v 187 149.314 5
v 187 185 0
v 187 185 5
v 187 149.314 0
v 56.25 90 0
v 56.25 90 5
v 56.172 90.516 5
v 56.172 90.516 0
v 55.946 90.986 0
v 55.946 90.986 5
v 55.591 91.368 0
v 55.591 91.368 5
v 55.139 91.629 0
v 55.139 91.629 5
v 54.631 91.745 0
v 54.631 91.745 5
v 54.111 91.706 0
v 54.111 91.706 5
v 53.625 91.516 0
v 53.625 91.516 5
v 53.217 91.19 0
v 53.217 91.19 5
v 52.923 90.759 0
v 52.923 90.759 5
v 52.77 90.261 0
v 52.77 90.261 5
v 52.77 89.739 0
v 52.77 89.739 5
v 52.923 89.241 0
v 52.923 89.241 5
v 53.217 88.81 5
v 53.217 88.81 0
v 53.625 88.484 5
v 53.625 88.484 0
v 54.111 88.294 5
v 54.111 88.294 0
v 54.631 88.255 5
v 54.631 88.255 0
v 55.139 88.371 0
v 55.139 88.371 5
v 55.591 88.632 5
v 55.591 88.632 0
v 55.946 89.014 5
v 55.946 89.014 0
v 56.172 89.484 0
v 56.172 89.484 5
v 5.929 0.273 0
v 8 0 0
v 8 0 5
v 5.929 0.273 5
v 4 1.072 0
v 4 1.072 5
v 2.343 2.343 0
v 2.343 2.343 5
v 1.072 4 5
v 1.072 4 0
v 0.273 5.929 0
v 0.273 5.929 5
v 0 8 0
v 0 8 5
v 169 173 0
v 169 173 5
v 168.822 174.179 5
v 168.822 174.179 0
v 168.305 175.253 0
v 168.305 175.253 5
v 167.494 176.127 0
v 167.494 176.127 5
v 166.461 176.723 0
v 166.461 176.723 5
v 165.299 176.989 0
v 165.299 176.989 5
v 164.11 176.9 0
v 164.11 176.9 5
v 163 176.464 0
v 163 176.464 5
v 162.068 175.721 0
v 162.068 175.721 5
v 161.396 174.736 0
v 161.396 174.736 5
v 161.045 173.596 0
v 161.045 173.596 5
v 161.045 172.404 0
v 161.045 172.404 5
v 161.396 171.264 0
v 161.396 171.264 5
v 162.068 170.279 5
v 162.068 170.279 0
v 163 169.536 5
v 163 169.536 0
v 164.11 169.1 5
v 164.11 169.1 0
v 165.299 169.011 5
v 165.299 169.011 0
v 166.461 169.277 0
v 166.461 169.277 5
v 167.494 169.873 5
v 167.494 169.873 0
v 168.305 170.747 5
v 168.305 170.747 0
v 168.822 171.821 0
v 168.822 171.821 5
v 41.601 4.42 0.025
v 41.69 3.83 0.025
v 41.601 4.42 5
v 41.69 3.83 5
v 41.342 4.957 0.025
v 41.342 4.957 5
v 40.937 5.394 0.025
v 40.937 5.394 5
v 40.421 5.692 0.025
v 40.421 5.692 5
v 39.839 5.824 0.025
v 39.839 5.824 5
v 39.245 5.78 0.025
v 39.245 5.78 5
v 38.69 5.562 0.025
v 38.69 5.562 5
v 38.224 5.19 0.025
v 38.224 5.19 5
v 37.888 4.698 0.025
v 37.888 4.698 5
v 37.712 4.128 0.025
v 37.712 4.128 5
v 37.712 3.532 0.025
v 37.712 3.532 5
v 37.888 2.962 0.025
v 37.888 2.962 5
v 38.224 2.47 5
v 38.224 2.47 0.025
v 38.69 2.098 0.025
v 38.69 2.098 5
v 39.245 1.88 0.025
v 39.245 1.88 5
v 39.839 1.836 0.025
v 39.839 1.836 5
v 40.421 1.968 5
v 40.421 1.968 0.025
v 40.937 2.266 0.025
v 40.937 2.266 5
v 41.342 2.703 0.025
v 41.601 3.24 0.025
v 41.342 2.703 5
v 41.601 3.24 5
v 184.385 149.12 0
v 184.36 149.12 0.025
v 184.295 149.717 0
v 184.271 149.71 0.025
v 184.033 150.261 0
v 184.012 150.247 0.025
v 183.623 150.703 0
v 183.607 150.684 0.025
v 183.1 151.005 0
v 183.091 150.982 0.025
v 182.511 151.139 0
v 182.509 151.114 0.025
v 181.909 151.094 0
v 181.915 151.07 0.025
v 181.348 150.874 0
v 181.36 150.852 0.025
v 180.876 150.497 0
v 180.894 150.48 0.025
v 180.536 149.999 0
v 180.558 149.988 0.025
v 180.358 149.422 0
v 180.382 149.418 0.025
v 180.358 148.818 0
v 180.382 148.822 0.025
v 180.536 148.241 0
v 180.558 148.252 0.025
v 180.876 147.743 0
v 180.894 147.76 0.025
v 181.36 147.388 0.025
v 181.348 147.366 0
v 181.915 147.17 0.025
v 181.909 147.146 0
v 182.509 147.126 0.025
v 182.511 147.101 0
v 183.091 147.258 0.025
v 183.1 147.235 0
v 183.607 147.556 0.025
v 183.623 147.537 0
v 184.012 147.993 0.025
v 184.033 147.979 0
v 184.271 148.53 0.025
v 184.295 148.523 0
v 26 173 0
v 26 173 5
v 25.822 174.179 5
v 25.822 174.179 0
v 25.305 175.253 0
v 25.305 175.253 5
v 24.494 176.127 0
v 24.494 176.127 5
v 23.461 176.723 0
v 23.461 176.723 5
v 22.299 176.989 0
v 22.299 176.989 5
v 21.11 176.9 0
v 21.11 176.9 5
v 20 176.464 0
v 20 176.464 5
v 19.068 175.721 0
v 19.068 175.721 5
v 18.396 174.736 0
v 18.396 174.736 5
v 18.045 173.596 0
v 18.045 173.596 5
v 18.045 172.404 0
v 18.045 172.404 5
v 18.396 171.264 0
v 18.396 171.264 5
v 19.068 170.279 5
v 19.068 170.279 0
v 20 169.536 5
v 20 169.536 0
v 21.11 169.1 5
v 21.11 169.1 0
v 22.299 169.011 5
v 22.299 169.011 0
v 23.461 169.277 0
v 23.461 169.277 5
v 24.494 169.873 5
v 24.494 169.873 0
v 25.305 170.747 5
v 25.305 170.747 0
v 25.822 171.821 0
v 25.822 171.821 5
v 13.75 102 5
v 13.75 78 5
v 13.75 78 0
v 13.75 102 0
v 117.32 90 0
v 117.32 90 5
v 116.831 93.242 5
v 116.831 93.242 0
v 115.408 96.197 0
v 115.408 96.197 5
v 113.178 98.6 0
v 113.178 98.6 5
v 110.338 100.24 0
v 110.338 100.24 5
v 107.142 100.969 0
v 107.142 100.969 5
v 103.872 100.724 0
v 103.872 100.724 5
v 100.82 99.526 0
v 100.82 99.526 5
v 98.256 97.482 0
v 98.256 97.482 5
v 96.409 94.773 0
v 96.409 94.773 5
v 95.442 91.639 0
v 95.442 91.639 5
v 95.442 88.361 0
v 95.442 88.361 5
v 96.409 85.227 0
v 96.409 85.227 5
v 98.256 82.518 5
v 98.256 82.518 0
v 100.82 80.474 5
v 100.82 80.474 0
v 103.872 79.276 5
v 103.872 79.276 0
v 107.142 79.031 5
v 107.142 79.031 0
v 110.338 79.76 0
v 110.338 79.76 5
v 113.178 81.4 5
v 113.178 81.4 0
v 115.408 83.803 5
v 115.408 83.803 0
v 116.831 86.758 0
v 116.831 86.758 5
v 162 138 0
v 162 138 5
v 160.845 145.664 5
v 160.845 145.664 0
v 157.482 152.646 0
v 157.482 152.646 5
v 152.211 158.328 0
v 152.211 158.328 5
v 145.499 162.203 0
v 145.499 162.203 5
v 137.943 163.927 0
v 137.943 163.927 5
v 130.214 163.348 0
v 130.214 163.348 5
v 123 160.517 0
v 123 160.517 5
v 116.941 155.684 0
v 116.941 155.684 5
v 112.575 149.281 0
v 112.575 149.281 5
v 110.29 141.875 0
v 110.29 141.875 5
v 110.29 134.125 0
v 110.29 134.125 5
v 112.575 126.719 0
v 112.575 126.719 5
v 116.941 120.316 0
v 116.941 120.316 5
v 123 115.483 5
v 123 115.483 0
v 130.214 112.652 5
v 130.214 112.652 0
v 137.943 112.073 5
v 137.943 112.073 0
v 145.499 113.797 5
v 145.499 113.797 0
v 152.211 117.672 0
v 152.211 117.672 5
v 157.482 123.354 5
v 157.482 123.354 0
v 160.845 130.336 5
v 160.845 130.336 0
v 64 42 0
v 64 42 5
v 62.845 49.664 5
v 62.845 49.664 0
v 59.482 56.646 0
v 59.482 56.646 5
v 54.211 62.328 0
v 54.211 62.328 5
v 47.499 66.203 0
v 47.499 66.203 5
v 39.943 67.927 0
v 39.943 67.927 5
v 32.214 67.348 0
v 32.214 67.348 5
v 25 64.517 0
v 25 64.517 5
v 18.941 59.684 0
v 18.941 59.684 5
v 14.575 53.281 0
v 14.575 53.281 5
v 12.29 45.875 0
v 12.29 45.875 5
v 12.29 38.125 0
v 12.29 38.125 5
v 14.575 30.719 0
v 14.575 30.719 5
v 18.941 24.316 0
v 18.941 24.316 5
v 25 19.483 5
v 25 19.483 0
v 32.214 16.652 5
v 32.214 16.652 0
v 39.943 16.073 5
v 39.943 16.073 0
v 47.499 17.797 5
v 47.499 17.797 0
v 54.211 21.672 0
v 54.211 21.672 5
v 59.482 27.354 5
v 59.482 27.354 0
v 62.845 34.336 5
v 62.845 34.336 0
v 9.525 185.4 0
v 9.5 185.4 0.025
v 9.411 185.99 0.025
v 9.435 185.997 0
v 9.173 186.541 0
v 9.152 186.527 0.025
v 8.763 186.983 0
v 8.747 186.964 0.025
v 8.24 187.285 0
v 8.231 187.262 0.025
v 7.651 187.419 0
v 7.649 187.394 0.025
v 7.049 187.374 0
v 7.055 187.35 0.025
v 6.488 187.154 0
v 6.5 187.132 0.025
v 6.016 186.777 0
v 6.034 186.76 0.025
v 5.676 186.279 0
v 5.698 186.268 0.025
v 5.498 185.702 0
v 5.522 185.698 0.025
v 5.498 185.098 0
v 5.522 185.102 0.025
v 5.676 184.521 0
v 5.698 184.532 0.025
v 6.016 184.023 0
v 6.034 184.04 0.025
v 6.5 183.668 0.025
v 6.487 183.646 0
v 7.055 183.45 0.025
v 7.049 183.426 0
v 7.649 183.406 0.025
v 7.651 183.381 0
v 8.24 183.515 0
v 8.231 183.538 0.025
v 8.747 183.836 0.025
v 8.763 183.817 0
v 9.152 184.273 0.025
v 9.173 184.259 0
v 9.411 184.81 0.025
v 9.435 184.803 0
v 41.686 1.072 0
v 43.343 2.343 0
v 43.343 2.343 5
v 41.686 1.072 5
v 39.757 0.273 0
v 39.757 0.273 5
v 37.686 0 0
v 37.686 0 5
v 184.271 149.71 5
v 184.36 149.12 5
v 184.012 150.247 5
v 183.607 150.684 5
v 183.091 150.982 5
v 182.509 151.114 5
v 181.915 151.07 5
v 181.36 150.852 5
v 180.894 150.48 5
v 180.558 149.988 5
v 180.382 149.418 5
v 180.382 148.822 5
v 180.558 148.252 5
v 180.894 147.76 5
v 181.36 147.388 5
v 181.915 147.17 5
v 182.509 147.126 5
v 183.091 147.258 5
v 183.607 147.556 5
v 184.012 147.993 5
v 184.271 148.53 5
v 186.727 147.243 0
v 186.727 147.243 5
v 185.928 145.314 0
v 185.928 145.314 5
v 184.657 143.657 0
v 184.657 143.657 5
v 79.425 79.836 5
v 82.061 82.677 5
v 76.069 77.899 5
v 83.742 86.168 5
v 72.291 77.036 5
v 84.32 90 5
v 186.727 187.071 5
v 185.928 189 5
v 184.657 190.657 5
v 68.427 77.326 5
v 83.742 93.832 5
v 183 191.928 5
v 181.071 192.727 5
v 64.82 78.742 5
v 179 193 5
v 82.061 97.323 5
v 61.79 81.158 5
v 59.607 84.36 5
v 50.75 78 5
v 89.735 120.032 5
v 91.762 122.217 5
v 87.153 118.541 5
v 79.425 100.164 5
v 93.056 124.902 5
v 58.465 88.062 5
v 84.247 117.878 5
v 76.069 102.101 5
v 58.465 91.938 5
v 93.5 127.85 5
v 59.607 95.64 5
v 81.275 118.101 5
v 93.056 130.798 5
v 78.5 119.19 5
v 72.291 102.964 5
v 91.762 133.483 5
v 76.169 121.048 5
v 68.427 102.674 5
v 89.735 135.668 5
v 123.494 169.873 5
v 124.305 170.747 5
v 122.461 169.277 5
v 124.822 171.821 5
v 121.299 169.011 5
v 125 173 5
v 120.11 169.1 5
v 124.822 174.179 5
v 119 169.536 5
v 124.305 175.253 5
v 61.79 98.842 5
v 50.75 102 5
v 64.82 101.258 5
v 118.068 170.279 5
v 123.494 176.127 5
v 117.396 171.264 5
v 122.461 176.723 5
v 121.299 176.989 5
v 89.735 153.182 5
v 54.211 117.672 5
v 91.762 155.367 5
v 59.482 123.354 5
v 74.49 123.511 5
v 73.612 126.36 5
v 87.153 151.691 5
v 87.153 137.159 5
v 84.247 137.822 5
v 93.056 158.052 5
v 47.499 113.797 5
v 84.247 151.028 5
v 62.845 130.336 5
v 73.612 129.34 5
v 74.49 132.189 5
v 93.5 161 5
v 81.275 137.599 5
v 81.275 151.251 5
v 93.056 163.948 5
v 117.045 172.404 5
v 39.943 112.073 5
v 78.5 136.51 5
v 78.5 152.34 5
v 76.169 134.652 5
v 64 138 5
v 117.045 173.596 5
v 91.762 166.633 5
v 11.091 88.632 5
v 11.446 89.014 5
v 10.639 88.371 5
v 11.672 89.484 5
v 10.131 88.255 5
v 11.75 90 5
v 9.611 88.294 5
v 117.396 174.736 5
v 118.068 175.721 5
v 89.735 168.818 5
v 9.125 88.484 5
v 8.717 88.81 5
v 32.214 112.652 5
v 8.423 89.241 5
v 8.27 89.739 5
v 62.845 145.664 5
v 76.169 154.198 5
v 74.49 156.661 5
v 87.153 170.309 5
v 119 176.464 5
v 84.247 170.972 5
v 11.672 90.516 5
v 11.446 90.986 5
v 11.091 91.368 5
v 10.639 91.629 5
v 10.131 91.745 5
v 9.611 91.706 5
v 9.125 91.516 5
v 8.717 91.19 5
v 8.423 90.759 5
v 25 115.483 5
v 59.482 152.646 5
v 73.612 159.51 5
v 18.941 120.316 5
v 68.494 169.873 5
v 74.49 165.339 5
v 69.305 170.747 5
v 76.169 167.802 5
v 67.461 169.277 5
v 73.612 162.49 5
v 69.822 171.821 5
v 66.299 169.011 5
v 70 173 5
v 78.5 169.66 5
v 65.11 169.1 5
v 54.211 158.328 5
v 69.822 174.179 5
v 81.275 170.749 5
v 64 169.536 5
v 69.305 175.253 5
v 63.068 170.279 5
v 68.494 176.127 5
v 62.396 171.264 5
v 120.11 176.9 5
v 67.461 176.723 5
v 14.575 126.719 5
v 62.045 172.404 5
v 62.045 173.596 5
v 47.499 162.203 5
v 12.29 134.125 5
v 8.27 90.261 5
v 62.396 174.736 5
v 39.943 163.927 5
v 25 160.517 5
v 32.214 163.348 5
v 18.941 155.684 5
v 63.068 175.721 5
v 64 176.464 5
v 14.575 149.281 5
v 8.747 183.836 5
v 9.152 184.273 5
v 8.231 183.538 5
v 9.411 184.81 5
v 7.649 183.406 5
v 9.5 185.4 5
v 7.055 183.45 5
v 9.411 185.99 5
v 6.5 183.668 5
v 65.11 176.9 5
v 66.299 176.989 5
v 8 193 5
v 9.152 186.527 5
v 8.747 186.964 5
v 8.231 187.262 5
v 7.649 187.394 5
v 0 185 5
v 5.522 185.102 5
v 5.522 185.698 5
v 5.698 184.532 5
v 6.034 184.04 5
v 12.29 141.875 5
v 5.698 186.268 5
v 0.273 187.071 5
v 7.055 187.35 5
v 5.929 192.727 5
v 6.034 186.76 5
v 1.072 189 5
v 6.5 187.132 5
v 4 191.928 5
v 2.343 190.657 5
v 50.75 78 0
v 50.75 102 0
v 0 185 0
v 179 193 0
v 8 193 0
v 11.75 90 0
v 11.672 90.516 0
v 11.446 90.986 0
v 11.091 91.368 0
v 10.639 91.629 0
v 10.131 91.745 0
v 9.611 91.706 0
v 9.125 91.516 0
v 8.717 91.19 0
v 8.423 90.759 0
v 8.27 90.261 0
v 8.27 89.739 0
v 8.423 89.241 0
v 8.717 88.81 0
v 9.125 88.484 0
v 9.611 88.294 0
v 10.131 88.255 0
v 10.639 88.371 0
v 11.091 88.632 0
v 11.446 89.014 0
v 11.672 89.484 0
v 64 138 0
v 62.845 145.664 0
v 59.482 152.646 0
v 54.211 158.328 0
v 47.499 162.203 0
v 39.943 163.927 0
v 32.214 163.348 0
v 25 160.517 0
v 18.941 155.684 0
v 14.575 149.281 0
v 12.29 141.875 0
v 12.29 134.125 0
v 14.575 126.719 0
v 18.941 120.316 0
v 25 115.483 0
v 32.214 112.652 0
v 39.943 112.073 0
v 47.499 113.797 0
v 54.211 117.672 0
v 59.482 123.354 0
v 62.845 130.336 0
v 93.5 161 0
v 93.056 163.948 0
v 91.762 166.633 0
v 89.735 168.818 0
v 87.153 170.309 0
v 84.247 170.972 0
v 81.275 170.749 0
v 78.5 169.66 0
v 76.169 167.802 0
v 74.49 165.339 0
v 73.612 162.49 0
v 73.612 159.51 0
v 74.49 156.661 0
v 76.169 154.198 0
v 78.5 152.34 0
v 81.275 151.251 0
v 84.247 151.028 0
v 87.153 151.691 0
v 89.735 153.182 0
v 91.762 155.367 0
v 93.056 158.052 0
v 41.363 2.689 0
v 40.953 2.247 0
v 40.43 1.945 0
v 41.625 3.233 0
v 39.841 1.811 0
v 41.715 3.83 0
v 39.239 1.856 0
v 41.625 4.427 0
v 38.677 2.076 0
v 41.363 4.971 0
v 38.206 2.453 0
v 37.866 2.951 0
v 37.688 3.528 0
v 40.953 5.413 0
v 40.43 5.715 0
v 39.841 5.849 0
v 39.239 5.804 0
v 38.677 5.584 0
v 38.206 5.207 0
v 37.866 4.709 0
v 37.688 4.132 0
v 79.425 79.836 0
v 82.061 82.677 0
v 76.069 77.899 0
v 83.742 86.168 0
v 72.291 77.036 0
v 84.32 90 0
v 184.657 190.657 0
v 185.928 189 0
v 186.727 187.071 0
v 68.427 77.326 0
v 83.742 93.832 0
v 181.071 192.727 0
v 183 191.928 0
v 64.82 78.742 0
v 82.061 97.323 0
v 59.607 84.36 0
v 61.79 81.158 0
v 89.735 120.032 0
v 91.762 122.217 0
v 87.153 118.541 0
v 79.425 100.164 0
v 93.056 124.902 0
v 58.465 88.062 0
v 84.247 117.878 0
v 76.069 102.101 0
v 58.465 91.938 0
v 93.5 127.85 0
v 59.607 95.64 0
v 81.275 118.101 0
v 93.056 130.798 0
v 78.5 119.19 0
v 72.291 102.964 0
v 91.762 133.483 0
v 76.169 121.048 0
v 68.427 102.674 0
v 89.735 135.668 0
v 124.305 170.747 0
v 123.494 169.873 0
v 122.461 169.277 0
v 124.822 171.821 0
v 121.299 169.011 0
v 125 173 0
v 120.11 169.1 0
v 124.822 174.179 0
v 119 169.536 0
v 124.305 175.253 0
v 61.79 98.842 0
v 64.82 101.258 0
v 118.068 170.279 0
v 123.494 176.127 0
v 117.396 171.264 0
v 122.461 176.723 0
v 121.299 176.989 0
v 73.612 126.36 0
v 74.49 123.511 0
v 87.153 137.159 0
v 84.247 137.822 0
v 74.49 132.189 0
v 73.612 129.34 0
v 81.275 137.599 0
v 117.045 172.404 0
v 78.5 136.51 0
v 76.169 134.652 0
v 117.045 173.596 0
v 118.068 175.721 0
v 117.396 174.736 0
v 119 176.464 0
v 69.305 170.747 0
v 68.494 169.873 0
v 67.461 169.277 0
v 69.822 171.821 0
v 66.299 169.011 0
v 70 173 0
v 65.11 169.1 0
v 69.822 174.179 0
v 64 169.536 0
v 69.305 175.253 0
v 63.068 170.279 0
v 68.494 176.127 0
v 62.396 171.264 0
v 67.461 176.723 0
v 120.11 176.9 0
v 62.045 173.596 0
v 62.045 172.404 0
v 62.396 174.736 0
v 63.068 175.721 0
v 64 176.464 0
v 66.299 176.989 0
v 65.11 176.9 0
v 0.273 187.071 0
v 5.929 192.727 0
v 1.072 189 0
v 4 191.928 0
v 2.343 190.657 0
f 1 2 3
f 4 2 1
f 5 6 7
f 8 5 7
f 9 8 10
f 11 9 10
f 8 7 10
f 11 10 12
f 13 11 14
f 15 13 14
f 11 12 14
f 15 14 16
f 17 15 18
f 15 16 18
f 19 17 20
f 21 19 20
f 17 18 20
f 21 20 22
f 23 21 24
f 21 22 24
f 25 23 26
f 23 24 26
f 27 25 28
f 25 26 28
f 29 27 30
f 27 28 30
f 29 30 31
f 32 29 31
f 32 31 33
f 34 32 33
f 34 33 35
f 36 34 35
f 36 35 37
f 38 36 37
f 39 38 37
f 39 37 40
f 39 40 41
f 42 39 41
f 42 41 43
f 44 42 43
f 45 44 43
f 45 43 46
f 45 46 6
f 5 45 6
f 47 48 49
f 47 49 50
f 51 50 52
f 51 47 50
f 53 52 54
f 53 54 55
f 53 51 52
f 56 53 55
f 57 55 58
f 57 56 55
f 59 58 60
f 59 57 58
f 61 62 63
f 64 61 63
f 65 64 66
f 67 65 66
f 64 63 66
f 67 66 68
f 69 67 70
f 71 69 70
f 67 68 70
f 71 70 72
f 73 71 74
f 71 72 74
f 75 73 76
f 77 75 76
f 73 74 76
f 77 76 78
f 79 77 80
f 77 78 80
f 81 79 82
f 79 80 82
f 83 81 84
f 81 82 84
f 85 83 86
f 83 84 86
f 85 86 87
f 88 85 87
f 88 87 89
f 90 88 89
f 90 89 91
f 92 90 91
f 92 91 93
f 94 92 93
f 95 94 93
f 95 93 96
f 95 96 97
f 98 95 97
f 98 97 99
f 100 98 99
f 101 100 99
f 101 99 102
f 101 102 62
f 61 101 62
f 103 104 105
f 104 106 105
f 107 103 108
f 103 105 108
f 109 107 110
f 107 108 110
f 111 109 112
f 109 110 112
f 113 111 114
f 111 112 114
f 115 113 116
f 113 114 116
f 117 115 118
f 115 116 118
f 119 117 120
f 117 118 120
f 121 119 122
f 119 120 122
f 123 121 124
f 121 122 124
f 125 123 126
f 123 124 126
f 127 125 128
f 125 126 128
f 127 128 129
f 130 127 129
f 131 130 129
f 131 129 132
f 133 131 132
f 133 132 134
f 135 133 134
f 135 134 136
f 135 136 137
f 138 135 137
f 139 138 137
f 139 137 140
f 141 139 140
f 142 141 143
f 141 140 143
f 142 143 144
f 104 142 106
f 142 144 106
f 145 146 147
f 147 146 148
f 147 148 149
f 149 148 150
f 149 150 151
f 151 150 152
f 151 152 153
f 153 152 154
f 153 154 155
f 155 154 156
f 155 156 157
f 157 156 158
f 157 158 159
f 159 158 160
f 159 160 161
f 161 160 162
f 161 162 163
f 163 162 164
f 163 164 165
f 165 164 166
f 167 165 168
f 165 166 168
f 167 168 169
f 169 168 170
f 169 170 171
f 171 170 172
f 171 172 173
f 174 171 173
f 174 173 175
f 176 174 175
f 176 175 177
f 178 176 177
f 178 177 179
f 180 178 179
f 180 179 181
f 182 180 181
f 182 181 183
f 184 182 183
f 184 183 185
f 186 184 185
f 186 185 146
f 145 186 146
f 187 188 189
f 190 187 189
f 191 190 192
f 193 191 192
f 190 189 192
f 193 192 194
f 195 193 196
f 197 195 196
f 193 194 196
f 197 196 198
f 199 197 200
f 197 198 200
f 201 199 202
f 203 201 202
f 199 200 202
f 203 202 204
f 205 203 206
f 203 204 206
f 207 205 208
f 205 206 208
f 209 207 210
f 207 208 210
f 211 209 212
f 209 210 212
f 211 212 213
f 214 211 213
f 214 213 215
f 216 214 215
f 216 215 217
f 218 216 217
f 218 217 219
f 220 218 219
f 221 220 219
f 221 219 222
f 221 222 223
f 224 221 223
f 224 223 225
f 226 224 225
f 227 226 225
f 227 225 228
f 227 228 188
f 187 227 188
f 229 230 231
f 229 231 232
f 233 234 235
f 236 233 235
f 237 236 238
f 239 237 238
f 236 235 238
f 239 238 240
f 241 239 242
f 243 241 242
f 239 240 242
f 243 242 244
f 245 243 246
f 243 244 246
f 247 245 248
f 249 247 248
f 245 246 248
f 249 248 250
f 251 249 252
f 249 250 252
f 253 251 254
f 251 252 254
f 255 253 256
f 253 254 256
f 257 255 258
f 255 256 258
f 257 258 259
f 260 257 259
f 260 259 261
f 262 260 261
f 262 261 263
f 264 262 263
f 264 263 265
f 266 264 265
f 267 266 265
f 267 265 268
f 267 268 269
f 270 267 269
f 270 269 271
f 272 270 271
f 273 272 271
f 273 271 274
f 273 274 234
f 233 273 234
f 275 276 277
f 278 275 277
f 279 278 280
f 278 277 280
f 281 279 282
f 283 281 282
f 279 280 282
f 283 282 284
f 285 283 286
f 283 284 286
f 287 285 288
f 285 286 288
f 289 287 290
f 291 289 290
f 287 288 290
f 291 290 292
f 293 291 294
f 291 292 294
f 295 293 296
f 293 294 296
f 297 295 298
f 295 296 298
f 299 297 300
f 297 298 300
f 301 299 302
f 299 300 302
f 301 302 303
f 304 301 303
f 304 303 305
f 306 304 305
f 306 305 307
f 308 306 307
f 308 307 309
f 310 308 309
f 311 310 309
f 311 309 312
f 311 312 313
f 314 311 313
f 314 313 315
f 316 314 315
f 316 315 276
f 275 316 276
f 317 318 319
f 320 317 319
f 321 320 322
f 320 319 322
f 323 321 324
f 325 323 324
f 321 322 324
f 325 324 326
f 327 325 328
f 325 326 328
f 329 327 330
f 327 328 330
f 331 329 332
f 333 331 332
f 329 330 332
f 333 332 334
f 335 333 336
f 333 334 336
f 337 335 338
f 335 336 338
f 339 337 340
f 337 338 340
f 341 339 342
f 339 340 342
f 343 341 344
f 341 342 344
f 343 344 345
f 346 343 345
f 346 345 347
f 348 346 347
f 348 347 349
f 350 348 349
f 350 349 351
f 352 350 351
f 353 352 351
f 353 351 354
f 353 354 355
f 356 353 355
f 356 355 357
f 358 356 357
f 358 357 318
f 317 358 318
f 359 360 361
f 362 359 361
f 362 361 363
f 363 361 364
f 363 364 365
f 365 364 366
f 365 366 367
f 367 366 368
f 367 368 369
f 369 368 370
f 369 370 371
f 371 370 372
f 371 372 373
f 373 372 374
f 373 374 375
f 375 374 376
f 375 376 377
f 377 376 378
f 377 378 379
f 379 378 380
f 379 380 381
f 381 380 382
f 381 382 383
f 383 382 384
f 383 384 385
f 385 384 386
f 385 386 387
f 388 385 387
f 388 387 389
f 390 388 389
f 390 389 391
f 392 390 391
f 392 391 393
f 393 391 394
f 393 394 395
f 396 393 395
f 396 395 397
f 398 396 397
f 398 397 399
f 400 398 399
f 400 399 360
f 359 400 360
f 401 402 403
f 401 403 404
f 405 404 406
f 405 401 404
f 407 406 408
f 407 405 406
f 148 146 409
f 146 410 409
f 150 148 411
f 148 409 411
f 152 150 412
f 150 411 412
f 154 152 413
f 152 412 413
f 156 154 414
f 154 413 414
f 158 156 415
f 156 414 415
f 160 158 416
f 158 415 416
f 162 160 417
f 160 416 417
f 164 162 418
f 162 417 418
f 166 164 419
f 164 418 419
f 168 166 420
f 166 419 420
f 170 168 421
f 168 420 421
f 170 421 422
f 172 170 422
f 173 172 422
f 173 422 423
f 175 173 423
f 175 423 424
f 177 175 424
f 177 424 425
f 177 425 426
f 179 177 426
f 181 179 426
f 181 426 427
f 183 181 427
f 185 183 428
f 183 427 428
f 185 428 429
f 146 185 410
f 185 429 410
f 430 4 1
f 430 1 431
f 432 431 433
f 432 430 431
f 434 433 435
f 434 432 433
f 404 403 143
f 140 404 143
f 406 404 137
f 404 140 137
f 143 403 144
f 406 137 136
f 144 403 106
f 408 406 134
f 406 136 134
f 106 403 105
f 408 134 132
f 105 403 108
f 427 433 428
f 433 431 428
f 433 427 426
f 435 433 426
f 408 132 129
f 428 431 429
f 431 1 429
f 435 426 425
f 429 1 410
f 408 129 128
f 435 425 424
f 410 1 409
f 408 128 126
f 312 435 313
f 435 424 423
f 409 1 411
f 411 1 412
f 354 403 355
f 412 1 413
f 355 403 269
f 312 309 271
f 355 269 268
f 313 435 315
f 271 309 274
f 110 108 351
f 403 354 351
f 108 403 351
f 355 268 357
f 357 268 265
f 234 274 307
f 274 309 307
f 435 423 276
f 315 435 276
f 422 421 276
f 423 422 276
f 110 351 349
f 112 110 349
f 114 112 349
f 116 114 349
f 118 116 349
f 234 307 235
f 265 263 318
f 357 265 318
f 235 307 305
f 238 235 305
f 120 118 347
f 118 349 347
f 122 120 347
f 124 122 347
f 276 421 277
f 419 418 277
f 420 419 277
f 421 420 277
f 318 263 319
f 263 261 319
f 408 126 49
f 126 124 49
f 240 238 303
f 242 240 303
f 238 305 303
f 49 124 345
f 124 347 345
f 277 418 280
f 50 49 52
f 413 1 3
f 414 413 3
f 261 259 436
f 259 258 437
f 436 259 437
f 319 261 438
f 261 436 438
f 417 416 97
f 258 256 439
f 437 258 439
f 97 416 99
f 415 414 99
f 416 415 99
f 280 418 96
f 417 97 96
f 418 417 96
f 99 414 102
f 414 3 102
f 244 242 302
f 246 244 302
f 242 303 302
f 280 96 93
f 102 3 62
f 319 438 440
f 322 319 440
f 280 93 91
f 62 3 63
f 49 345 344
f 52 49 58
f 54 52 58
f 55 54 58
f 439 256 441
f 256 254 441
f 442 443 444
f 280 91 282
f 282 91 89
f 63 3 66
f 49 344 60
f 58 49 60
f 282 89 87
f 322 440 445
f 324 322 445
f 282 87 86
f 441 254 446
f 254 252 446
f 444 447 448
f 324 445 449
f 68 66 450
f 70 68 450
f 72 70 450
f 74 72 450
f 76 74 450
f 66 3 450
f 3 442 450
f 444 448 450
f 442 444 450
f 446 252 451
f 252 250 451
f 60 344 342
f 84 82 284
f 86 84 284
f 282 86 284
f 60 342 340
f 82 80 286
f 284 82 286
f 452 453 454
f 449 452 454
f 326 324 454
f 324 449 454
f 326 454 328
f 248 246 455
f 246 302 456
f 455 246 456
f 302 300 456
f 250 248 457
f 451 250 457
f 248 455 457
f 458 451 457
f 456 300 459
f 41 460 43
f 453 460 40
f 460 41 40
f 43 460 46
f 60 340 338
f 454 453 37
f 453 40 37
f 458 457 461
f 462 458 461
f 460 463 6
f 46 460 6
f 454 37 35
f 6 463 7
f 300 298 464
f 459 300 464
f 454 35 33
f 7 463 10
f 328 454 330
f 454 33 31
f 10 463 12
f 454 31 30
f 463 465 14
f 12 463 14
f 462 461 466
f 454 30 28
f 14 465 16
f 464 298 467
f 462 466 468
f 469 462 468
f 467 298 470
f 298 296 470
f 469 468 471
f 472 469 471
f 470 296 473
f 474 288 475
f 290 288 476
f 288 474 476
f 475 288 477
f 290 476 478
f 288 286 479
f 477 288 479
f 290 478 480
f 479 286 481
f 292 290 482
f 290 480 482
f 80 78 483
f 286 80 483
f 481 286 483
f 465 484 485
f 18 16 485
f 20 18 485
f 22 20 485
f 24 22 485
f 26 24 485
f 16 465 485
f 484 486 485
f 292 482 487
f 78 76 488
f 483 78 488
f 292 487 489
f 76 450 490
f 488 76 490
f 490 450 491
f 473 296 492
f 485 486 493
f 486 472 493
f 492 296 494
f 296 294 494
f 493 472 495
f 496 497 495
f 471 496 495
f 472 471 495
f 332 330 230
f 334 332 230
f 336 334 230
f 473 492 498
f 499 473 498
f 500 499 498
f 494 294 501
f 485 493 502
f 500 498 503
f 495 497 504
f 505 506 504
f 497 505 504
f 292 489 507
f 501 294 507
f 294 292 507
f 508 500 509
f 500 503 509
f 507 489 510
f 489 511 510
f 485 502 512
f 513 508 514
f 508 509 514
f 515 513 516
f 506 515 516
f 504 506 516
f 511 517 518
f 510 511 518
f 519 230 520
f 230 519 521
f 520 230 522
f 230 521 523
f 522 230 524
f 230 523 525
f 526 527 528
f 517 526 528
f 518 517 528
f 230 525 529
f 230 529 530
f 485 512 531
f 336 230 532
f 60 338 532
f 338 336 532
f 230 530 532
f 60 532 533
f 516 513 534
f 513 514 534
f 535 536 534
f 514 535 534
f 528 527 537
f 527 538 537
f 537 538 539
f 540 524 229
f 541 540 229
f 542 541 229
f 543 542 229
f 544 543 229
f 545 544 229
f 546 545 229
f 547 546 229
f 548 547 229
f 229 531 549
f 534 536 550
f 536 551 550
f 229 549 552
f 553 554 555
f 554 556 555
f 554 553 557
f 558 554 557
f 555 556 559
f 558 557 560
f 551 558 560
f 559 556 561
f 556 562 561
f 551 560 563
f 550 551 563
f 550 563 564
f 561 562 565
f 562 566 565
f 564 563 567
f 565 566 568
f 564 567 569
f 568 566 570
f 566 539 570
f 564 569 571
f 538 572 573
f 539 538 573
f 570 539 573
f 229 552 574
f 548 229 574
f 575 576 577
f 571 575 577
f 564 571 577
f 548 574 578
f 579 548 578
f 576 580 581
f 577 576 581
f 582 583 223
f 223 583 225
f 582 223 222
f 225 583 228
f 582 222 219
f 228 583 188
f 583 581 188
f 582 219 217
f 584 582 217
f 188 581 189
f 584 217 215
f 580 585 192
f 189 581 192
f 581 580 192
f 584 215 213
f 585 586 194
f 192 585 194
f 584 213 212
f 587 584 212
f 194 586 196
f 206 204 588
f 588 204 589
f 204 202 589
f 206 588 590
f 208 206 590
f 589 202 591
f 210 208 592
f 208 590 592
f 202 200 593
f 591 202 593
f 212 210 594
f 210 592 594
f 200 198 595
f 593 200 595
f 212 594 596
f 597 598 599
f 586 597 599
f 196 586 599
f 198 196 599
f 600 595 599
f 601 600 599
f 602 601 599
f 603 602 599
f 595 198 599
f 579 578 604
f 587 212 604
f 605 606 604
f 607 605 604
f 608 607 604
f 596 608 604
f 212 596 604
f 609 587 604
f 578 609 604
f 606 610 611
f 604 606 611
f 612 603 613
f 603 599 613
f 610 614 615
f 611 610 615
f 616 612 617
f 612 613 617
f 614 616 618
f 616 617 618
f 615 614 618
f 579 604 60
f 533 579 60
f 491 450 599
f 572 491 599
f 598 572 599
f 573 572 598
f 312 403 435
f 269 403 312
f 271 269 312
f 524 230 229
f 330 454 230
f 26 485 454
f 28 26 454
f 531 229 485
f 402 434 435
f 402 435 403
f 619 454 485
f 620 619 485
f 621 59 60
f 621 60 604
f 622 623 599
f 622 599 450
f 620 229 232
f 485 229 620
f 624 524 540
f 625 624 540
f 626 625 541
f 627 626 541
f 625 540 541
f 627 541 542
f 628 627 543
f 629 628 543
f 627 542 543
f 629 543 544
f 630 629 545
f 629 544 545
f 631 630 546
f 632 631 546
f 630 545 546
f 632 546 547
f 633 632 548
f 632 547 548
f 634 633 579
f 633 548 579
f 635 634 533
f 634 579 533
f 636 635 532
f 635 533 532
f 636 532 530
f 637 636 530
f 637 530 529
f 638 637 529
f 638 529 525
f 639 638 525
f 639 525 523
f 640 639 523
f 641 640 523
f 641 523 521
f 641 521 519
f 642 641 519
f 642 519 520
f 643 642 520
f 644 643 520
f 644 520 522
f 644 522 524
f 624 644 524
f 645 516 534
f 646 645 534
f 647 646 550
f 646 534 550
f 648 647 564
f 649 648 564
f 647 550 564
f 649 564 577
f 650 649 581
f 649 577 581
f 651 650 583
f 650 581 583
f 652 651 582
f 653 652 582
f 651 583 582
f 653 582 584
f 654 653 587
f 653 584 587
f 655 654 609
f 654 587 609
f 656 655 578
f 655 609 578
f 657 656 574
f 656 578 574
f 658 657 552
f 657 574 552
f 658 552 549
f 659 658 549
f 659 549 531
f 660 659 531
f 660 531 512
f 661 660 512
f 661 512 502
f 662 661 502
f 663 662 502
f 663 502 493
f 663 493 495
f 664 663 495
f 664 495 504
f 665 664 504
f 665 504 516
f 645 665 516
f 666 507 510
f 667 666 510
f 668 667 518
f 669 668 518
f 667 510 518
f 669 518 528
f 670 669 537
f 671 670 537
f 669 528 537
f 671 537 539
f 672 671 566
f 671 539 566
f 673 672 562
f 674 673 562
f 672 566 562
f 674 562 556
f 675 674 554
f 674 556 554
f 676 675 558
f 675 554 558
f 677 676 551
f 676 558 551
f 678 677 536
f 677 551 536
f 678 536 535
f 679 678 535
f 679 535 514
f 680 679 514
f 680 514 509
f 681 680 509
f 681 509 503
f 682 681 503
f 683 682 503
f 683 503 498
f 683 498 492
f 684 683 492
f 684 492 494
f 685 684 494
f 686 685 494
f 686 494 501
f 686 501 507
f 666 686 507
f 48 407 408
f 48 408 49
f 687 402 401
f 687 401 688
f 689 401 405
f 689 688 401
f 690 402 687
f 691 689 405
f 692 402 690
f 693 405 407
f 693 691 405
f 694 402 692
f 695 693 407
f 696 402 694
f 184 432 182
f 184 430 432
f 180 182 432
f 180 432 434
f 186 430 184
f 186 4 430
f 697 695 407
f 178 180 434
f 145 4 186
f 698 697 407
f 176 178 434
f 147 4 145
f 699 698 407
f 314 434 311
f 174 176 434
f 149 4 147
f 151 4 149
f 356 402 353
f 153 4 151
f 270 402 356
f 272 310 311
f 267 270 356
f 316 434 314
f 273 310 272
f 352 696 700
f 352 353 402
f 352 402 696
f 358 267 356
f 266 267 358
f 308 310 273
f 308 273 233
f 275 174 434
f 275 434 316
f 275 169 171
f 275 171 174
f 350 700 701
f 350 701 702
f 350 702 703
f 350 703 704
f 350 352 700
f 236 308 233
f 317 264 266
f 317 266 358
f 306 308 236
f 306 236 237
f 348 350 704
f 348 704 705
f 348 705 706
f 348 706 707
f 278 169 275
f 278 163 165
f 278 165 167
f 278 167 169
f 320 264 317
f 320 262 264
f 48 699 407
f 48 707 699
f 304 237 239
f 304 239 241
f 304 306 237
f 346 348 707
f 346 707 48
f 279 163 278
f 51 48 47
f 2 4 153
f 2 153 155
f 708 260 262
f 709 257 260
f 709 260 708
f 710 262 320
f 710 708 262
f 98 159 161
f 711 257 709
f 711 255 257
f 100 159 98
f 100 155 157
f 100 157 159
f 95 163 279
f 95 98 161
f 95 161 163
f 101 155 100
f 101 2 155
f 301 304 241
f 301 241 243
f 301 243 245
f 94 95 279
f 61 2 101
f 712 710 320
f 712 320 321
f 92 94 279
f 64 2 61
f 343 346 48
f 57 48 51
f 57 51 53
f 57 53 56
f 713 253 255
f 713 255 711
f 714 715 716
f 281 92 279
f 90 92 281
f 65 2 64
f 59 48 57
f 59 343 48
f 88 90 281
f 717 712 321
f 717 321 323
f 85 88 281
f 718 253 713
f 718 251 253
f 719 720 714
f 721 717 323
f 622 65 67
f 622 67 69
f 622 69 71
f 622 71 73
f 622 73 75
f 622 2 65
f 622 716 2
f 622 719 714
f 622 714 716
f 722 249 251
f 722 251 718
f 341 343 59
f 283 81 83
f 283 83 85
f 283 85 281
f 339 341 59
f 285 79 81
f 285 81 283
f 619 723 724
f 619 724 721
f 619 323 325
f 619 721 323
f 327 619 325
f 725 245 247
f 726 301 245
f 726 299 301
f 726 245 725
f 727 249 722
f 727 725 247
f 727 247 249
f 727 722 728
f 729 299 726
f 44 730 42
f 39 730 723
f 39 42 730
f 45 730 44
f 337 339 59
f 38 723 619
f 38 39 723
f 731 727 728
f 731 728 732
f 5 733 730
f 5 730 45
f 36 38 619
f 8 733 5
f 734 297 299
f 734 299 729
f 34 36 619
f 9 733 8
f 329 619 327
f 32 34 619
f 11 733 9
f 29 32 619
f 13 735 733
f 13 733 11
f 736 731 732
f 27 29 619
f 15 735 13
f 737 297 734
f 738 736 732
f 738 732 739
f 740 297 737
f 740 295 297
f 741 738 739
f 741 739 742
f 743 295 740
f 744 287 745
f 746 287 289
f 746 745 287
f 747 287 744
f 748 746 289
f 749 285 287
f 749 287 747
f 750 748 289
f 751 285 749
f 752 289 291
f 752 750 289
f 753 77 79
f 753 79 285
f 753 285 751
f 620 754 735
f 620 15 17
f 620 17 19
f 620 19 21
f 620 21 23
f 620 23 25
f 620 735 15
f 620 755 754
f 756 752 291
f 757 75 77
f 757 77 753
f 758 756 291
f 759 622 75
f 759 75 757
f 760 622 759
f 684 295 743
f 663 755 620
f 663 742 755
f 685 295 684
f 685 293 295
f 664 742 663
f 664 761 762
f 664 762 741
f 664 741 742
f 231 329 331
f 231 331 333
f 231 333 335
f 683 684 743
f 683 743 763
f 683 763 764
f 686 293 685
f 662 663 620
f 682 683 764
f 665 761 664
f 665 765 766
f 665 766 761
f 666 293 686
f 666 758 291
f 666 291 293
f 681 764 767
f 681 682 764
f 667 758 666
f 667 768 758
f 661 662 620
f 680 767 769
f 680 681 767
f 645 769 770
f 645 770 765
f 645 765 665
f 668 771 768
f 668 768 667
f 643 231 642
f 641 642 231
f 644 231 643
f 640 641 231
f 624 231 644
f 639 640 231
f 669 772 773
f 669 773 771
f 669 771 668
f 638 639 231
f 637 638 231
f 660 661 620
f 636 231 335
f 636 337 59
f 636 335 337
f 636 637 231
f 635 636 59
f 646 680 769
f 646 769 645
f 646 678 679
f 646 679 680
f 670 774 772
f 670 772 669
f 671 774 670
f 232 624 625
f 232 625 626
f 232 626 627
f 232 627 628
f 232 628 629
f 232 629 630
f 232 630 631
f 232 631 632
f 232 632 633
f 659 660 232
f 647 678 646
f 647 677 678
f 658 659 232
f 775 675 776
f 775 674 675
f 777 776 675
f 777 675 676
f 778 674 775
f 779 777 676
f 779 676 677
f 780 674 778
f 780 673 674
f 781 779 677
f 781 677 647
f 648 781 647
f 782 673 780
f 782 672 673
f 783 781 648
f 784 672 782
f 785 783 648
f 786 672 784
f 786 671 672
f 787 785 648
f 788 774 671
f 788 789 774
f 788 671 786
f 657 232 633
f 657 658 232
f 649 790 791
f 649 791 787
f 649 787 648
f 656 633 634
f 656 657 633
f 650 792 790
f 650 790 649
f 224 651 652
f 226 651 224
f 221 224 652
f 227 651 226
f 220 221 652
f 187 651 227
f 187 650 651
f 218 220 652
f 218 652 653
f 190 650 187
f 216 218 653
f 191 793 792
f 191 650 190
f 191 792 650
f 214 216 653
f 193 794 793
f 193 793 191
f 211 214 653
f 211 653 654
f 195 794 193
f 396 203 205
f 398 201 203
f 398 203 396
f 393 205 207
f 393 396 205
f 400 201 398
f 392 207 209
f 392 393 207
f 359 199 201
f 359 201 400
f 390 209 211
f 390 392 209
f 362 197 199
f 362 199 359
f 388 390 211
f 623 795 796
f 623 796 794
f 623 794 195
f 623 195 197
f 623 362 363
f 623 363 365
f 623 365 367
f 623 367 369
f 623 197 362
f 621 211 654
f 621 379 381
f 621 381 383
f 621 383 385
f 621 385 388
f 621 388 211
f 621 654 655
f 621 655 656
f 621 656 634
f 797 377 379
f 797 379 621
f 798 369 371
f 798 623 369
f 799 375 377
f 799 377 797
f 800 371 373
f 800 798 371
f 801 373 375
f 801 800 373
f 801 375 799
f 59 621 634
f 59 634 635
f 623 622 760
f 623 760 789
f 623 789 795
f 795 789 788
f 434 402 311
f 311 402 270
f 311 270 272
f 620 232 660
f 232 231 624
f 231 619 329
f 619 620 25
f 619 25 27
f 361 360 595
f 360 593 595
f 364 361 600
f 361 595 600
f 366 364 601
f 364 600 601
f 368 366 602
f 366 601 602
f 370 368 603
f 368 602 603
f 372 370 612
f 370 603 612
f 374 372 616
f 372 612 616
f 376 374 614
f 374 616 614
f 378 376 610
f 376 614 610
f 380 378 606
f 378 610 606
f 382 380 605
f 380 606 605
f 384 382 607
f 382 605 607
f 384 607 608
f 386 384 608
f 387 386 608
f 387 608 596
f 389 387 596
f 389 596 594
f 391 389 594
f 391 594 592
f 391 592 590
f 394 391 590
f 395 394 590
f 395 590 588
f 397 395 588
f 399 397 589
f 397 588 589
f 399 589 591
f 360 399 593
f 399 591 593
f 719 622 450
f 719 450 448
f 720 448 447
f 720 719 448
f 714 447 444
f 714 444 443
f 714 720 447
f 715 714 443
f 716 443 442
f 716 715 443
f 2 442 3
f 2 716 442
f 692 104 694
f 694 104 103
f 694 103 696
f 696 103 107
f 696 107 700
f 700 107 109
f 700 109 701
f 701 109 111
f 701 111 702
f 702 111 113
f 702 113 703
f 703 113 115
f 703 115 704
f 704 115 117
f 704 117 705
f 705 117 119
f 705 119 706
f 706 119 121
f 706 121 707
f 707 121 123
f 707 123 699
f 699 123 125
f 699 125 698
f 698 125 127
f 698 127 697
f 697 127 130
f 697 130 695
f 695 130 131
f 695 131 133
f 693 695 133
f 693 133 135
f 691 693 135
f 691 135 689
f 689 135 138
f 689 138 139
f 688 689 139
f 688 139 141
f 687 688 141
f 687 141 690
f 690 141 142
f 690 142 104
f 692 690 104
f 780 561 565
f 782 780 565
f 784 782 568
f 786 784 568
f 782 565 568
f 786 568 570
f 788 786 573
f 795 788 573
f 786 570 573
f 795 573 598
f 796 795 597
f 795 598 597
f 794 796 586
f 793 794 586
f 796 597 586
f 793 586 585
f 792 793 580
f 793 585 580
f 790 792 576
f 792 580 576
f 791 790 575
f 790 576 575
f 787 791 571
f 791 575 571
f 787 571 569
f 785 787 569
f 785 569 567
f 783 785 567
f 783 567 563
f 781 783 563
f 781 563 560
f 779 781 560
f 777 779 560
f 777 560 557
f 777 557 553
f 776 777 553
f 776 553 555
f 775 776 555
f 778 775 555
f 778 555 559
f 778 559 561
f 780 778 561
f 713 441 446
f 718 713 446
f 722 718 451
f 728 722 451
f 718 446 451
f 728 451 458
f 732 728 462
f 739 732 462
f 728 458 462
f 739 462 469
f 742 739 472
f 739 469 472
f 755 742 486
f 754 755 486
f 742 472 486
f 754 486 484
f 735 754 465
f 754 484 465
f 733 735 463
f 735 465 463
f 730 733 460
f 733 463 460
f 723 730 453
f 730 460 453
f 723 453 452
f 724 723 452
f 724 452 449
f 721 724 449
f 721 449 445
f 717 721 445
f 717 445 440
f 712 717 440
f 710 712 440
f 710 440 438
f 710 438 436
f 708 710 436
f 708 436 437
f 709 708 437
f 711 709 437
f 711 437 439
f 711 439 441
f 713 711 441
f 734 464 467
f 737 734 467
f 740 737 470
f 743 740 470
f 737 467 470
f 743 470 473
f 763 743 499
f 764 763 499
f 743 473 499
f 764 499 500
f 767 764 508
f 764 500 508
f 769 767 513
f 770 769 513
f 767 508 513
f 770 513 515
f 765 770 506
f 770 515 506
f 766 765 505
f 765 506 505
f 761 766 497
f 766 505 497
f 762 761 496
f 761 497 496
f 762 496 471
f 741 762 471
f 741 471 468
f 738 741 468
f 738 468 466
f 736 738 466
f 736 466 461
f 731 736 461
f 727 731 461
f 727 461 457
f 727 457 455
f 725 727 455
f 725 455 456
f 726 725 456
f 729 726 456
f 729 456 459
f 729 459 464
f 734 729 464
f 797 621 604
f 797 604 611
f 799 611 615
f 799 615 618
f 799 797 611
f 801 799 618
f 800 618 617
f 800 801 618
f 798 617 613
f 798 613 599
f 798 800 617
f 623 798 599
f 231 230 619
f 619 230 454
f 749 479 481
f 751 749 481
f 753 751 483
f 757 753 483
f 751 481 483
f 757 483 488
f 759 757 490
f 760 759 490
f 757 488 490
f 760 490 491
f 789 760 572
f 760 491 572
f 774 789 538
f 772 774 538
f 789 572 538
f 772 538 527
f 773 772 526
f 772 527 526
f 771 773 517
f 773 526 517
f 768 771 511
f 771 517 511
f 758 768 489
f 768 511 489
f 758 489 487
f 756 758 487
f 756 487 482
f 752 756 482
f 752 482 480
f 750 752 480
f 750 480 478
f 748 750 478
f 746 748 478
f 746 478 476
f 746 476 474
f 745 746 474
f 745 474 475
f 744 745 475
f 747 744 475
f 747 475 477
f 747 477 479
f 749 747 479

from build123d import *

# Parameters (mm, degrees)
ESTRUSIONE_ESTRUSIONE1_DEPTH    = 5
SCHIZZO5_R                      = 1.75
SCHIZZO5_R_2                    = 10
SCHIZZO5_R_3                    = 11
SCHIZZO5_R_4                    = 13
SCHIZZO5_R_5                    = 26
SCHIZZO5_W                      = 37
SCHIZZO5_H                      = 24
TAGLIO_ESTRUSIONE2_DEPTH        = 7
SCHIZZO6_R                      = 4
TAGLIO_ESTRUSIONE3_DEPTH        = 10
FORI_ALESATO_4_0MM1_D           = 4
FORI_ALESATO_4_0MM1_DEPTH       = 40.6
FORI_ALESATO_4_0MM1_CSINK_D     = 4.05
FORI_ALESATO_4_0MM1_CSINK_ANGLE = 90
FORI_ALESATO_4_0MM1_TIP         = 1.201721238


with BuildPart() as part:
    # Schizzo1 → Estrusione-Estrusione1 (new body)
    with BuildSketch(Plane.XY):
        with BuildLine():
            Line((0, 8), (0, 185))
            ThreePointArc((0, 185), (2.343145751, 190.656854249), (8, 193))
            Line((8, 193), (179, 193))
            ThreePointArc((179, 193), (184.656854249, 190.656854249), (187, 185))
            Line((187, 185), (187, 149.313708499))
            ThreePointArc((187, 149.313708499), (186.39103626, 146.25224104), (184.656854249, 143.656854249))
            Line((184.656854249, 143.656854249), (43.343145751, 2.343145751))
            ThreePointArc((43.343145751, 2.343145751), (40.74775896, 0.60896374), (37.686291501, 0))
            Line((37.686291501, 0), (8, 0))
            ThreePointArc((8, 0), (2.343145751, 2.343145751), (0, 8))
        make_face()
    extrude(amount=ESTRUSIONE_ESTRUSIONE1_DEPTH)

    # Schizzo5 → Taglio-Estrusione2 (cut)
    with BuildSketch(Plane.XY.offset(5)):
        with Locations((10, 90)):
            Circle(SCHIZZO5_R)
        with Locations((54.5, 90)):
            Circle(SCHIZZO5_R)
        with Locations((83.5, 161)):
            Circle(SCHIZZO5_R_2)
        with Locations((106.319509986, 90)):
            Circle(SCHIZZO5_R_3)
        with Locations((71.319509986, 90)):
            Circle(SCHIZZO5_R_4)
        with Locations((38, 138)):
            Circle(SCHIZZO5_R_5)
        with Locations((136, 138)):
            Circle(SCHIZZO5_R_5)
        with Locations((38, 42)):
            Circle(SCHIZZO5_R_5)
        with Locations((83.5, 127.850051573)):
            Circle(SCHIZZO5_R_2)
        with Locations((32.25, 90)):
            Rectangle(SCHIZZO5_W, SCHIZZO5_H)
    extrude(amount=-TAGLIO_ESTRUSIONE2_DEPTH, mode=Mode.SUBTRACT)

    # Schizzo6 → Taglio-Estrusione3 (cut)
    with BuildSketch(Plane.XY.offset(5)):
        with Locations((22, 173)):
            Circle(SCHIZZO6_R)
        with Locations((66, 173)):
            Circle(SCHIZZO6_R)
        with Locations((121, 173)):
            Circle(SCHIZZO6_R)
        with Locations((165, 173)):
            Circle(SCHIZZO6_R)
    extrude(amount=-TAGLIO_ESTRUSIONE3_DEPTH, mode=Mode.SUBTRACT)

    # Fori Alesato Ø4.0mm1
    with Locations(Plane(origin=(0, 0, 0), x_dir=(-1, 0, 0), z_dir=(0, 0, -1))):
        with Locations((-182.36, 149.12), (-7.5, 185.4), (-39.69, 3.83)):
            CounterSinkHole(FORI_ALESATO_4_0MM1_D / 2, FORI_ALESATO_4_0MM1_CSINK_D / 2, depth=FORI_ALESATO_4_0MM1_DEPTH, counter_sink_angle=FORI_ALESATO_4_0MM1_CSINK_ANGLE)
            with Locations((0, 0, -(FORI_ALESATO_4_0MM1_DEPTH + FORI_ALESATO_4_0MM1_TIP / 2))):  # 118° drill point
                Cone(0, FORI_ALESATO_4_0MM1_D / 2, FORI_ALESATO_4_0MM1_TIP, mode=Mode.SUBTRACT)


solid = part.part
